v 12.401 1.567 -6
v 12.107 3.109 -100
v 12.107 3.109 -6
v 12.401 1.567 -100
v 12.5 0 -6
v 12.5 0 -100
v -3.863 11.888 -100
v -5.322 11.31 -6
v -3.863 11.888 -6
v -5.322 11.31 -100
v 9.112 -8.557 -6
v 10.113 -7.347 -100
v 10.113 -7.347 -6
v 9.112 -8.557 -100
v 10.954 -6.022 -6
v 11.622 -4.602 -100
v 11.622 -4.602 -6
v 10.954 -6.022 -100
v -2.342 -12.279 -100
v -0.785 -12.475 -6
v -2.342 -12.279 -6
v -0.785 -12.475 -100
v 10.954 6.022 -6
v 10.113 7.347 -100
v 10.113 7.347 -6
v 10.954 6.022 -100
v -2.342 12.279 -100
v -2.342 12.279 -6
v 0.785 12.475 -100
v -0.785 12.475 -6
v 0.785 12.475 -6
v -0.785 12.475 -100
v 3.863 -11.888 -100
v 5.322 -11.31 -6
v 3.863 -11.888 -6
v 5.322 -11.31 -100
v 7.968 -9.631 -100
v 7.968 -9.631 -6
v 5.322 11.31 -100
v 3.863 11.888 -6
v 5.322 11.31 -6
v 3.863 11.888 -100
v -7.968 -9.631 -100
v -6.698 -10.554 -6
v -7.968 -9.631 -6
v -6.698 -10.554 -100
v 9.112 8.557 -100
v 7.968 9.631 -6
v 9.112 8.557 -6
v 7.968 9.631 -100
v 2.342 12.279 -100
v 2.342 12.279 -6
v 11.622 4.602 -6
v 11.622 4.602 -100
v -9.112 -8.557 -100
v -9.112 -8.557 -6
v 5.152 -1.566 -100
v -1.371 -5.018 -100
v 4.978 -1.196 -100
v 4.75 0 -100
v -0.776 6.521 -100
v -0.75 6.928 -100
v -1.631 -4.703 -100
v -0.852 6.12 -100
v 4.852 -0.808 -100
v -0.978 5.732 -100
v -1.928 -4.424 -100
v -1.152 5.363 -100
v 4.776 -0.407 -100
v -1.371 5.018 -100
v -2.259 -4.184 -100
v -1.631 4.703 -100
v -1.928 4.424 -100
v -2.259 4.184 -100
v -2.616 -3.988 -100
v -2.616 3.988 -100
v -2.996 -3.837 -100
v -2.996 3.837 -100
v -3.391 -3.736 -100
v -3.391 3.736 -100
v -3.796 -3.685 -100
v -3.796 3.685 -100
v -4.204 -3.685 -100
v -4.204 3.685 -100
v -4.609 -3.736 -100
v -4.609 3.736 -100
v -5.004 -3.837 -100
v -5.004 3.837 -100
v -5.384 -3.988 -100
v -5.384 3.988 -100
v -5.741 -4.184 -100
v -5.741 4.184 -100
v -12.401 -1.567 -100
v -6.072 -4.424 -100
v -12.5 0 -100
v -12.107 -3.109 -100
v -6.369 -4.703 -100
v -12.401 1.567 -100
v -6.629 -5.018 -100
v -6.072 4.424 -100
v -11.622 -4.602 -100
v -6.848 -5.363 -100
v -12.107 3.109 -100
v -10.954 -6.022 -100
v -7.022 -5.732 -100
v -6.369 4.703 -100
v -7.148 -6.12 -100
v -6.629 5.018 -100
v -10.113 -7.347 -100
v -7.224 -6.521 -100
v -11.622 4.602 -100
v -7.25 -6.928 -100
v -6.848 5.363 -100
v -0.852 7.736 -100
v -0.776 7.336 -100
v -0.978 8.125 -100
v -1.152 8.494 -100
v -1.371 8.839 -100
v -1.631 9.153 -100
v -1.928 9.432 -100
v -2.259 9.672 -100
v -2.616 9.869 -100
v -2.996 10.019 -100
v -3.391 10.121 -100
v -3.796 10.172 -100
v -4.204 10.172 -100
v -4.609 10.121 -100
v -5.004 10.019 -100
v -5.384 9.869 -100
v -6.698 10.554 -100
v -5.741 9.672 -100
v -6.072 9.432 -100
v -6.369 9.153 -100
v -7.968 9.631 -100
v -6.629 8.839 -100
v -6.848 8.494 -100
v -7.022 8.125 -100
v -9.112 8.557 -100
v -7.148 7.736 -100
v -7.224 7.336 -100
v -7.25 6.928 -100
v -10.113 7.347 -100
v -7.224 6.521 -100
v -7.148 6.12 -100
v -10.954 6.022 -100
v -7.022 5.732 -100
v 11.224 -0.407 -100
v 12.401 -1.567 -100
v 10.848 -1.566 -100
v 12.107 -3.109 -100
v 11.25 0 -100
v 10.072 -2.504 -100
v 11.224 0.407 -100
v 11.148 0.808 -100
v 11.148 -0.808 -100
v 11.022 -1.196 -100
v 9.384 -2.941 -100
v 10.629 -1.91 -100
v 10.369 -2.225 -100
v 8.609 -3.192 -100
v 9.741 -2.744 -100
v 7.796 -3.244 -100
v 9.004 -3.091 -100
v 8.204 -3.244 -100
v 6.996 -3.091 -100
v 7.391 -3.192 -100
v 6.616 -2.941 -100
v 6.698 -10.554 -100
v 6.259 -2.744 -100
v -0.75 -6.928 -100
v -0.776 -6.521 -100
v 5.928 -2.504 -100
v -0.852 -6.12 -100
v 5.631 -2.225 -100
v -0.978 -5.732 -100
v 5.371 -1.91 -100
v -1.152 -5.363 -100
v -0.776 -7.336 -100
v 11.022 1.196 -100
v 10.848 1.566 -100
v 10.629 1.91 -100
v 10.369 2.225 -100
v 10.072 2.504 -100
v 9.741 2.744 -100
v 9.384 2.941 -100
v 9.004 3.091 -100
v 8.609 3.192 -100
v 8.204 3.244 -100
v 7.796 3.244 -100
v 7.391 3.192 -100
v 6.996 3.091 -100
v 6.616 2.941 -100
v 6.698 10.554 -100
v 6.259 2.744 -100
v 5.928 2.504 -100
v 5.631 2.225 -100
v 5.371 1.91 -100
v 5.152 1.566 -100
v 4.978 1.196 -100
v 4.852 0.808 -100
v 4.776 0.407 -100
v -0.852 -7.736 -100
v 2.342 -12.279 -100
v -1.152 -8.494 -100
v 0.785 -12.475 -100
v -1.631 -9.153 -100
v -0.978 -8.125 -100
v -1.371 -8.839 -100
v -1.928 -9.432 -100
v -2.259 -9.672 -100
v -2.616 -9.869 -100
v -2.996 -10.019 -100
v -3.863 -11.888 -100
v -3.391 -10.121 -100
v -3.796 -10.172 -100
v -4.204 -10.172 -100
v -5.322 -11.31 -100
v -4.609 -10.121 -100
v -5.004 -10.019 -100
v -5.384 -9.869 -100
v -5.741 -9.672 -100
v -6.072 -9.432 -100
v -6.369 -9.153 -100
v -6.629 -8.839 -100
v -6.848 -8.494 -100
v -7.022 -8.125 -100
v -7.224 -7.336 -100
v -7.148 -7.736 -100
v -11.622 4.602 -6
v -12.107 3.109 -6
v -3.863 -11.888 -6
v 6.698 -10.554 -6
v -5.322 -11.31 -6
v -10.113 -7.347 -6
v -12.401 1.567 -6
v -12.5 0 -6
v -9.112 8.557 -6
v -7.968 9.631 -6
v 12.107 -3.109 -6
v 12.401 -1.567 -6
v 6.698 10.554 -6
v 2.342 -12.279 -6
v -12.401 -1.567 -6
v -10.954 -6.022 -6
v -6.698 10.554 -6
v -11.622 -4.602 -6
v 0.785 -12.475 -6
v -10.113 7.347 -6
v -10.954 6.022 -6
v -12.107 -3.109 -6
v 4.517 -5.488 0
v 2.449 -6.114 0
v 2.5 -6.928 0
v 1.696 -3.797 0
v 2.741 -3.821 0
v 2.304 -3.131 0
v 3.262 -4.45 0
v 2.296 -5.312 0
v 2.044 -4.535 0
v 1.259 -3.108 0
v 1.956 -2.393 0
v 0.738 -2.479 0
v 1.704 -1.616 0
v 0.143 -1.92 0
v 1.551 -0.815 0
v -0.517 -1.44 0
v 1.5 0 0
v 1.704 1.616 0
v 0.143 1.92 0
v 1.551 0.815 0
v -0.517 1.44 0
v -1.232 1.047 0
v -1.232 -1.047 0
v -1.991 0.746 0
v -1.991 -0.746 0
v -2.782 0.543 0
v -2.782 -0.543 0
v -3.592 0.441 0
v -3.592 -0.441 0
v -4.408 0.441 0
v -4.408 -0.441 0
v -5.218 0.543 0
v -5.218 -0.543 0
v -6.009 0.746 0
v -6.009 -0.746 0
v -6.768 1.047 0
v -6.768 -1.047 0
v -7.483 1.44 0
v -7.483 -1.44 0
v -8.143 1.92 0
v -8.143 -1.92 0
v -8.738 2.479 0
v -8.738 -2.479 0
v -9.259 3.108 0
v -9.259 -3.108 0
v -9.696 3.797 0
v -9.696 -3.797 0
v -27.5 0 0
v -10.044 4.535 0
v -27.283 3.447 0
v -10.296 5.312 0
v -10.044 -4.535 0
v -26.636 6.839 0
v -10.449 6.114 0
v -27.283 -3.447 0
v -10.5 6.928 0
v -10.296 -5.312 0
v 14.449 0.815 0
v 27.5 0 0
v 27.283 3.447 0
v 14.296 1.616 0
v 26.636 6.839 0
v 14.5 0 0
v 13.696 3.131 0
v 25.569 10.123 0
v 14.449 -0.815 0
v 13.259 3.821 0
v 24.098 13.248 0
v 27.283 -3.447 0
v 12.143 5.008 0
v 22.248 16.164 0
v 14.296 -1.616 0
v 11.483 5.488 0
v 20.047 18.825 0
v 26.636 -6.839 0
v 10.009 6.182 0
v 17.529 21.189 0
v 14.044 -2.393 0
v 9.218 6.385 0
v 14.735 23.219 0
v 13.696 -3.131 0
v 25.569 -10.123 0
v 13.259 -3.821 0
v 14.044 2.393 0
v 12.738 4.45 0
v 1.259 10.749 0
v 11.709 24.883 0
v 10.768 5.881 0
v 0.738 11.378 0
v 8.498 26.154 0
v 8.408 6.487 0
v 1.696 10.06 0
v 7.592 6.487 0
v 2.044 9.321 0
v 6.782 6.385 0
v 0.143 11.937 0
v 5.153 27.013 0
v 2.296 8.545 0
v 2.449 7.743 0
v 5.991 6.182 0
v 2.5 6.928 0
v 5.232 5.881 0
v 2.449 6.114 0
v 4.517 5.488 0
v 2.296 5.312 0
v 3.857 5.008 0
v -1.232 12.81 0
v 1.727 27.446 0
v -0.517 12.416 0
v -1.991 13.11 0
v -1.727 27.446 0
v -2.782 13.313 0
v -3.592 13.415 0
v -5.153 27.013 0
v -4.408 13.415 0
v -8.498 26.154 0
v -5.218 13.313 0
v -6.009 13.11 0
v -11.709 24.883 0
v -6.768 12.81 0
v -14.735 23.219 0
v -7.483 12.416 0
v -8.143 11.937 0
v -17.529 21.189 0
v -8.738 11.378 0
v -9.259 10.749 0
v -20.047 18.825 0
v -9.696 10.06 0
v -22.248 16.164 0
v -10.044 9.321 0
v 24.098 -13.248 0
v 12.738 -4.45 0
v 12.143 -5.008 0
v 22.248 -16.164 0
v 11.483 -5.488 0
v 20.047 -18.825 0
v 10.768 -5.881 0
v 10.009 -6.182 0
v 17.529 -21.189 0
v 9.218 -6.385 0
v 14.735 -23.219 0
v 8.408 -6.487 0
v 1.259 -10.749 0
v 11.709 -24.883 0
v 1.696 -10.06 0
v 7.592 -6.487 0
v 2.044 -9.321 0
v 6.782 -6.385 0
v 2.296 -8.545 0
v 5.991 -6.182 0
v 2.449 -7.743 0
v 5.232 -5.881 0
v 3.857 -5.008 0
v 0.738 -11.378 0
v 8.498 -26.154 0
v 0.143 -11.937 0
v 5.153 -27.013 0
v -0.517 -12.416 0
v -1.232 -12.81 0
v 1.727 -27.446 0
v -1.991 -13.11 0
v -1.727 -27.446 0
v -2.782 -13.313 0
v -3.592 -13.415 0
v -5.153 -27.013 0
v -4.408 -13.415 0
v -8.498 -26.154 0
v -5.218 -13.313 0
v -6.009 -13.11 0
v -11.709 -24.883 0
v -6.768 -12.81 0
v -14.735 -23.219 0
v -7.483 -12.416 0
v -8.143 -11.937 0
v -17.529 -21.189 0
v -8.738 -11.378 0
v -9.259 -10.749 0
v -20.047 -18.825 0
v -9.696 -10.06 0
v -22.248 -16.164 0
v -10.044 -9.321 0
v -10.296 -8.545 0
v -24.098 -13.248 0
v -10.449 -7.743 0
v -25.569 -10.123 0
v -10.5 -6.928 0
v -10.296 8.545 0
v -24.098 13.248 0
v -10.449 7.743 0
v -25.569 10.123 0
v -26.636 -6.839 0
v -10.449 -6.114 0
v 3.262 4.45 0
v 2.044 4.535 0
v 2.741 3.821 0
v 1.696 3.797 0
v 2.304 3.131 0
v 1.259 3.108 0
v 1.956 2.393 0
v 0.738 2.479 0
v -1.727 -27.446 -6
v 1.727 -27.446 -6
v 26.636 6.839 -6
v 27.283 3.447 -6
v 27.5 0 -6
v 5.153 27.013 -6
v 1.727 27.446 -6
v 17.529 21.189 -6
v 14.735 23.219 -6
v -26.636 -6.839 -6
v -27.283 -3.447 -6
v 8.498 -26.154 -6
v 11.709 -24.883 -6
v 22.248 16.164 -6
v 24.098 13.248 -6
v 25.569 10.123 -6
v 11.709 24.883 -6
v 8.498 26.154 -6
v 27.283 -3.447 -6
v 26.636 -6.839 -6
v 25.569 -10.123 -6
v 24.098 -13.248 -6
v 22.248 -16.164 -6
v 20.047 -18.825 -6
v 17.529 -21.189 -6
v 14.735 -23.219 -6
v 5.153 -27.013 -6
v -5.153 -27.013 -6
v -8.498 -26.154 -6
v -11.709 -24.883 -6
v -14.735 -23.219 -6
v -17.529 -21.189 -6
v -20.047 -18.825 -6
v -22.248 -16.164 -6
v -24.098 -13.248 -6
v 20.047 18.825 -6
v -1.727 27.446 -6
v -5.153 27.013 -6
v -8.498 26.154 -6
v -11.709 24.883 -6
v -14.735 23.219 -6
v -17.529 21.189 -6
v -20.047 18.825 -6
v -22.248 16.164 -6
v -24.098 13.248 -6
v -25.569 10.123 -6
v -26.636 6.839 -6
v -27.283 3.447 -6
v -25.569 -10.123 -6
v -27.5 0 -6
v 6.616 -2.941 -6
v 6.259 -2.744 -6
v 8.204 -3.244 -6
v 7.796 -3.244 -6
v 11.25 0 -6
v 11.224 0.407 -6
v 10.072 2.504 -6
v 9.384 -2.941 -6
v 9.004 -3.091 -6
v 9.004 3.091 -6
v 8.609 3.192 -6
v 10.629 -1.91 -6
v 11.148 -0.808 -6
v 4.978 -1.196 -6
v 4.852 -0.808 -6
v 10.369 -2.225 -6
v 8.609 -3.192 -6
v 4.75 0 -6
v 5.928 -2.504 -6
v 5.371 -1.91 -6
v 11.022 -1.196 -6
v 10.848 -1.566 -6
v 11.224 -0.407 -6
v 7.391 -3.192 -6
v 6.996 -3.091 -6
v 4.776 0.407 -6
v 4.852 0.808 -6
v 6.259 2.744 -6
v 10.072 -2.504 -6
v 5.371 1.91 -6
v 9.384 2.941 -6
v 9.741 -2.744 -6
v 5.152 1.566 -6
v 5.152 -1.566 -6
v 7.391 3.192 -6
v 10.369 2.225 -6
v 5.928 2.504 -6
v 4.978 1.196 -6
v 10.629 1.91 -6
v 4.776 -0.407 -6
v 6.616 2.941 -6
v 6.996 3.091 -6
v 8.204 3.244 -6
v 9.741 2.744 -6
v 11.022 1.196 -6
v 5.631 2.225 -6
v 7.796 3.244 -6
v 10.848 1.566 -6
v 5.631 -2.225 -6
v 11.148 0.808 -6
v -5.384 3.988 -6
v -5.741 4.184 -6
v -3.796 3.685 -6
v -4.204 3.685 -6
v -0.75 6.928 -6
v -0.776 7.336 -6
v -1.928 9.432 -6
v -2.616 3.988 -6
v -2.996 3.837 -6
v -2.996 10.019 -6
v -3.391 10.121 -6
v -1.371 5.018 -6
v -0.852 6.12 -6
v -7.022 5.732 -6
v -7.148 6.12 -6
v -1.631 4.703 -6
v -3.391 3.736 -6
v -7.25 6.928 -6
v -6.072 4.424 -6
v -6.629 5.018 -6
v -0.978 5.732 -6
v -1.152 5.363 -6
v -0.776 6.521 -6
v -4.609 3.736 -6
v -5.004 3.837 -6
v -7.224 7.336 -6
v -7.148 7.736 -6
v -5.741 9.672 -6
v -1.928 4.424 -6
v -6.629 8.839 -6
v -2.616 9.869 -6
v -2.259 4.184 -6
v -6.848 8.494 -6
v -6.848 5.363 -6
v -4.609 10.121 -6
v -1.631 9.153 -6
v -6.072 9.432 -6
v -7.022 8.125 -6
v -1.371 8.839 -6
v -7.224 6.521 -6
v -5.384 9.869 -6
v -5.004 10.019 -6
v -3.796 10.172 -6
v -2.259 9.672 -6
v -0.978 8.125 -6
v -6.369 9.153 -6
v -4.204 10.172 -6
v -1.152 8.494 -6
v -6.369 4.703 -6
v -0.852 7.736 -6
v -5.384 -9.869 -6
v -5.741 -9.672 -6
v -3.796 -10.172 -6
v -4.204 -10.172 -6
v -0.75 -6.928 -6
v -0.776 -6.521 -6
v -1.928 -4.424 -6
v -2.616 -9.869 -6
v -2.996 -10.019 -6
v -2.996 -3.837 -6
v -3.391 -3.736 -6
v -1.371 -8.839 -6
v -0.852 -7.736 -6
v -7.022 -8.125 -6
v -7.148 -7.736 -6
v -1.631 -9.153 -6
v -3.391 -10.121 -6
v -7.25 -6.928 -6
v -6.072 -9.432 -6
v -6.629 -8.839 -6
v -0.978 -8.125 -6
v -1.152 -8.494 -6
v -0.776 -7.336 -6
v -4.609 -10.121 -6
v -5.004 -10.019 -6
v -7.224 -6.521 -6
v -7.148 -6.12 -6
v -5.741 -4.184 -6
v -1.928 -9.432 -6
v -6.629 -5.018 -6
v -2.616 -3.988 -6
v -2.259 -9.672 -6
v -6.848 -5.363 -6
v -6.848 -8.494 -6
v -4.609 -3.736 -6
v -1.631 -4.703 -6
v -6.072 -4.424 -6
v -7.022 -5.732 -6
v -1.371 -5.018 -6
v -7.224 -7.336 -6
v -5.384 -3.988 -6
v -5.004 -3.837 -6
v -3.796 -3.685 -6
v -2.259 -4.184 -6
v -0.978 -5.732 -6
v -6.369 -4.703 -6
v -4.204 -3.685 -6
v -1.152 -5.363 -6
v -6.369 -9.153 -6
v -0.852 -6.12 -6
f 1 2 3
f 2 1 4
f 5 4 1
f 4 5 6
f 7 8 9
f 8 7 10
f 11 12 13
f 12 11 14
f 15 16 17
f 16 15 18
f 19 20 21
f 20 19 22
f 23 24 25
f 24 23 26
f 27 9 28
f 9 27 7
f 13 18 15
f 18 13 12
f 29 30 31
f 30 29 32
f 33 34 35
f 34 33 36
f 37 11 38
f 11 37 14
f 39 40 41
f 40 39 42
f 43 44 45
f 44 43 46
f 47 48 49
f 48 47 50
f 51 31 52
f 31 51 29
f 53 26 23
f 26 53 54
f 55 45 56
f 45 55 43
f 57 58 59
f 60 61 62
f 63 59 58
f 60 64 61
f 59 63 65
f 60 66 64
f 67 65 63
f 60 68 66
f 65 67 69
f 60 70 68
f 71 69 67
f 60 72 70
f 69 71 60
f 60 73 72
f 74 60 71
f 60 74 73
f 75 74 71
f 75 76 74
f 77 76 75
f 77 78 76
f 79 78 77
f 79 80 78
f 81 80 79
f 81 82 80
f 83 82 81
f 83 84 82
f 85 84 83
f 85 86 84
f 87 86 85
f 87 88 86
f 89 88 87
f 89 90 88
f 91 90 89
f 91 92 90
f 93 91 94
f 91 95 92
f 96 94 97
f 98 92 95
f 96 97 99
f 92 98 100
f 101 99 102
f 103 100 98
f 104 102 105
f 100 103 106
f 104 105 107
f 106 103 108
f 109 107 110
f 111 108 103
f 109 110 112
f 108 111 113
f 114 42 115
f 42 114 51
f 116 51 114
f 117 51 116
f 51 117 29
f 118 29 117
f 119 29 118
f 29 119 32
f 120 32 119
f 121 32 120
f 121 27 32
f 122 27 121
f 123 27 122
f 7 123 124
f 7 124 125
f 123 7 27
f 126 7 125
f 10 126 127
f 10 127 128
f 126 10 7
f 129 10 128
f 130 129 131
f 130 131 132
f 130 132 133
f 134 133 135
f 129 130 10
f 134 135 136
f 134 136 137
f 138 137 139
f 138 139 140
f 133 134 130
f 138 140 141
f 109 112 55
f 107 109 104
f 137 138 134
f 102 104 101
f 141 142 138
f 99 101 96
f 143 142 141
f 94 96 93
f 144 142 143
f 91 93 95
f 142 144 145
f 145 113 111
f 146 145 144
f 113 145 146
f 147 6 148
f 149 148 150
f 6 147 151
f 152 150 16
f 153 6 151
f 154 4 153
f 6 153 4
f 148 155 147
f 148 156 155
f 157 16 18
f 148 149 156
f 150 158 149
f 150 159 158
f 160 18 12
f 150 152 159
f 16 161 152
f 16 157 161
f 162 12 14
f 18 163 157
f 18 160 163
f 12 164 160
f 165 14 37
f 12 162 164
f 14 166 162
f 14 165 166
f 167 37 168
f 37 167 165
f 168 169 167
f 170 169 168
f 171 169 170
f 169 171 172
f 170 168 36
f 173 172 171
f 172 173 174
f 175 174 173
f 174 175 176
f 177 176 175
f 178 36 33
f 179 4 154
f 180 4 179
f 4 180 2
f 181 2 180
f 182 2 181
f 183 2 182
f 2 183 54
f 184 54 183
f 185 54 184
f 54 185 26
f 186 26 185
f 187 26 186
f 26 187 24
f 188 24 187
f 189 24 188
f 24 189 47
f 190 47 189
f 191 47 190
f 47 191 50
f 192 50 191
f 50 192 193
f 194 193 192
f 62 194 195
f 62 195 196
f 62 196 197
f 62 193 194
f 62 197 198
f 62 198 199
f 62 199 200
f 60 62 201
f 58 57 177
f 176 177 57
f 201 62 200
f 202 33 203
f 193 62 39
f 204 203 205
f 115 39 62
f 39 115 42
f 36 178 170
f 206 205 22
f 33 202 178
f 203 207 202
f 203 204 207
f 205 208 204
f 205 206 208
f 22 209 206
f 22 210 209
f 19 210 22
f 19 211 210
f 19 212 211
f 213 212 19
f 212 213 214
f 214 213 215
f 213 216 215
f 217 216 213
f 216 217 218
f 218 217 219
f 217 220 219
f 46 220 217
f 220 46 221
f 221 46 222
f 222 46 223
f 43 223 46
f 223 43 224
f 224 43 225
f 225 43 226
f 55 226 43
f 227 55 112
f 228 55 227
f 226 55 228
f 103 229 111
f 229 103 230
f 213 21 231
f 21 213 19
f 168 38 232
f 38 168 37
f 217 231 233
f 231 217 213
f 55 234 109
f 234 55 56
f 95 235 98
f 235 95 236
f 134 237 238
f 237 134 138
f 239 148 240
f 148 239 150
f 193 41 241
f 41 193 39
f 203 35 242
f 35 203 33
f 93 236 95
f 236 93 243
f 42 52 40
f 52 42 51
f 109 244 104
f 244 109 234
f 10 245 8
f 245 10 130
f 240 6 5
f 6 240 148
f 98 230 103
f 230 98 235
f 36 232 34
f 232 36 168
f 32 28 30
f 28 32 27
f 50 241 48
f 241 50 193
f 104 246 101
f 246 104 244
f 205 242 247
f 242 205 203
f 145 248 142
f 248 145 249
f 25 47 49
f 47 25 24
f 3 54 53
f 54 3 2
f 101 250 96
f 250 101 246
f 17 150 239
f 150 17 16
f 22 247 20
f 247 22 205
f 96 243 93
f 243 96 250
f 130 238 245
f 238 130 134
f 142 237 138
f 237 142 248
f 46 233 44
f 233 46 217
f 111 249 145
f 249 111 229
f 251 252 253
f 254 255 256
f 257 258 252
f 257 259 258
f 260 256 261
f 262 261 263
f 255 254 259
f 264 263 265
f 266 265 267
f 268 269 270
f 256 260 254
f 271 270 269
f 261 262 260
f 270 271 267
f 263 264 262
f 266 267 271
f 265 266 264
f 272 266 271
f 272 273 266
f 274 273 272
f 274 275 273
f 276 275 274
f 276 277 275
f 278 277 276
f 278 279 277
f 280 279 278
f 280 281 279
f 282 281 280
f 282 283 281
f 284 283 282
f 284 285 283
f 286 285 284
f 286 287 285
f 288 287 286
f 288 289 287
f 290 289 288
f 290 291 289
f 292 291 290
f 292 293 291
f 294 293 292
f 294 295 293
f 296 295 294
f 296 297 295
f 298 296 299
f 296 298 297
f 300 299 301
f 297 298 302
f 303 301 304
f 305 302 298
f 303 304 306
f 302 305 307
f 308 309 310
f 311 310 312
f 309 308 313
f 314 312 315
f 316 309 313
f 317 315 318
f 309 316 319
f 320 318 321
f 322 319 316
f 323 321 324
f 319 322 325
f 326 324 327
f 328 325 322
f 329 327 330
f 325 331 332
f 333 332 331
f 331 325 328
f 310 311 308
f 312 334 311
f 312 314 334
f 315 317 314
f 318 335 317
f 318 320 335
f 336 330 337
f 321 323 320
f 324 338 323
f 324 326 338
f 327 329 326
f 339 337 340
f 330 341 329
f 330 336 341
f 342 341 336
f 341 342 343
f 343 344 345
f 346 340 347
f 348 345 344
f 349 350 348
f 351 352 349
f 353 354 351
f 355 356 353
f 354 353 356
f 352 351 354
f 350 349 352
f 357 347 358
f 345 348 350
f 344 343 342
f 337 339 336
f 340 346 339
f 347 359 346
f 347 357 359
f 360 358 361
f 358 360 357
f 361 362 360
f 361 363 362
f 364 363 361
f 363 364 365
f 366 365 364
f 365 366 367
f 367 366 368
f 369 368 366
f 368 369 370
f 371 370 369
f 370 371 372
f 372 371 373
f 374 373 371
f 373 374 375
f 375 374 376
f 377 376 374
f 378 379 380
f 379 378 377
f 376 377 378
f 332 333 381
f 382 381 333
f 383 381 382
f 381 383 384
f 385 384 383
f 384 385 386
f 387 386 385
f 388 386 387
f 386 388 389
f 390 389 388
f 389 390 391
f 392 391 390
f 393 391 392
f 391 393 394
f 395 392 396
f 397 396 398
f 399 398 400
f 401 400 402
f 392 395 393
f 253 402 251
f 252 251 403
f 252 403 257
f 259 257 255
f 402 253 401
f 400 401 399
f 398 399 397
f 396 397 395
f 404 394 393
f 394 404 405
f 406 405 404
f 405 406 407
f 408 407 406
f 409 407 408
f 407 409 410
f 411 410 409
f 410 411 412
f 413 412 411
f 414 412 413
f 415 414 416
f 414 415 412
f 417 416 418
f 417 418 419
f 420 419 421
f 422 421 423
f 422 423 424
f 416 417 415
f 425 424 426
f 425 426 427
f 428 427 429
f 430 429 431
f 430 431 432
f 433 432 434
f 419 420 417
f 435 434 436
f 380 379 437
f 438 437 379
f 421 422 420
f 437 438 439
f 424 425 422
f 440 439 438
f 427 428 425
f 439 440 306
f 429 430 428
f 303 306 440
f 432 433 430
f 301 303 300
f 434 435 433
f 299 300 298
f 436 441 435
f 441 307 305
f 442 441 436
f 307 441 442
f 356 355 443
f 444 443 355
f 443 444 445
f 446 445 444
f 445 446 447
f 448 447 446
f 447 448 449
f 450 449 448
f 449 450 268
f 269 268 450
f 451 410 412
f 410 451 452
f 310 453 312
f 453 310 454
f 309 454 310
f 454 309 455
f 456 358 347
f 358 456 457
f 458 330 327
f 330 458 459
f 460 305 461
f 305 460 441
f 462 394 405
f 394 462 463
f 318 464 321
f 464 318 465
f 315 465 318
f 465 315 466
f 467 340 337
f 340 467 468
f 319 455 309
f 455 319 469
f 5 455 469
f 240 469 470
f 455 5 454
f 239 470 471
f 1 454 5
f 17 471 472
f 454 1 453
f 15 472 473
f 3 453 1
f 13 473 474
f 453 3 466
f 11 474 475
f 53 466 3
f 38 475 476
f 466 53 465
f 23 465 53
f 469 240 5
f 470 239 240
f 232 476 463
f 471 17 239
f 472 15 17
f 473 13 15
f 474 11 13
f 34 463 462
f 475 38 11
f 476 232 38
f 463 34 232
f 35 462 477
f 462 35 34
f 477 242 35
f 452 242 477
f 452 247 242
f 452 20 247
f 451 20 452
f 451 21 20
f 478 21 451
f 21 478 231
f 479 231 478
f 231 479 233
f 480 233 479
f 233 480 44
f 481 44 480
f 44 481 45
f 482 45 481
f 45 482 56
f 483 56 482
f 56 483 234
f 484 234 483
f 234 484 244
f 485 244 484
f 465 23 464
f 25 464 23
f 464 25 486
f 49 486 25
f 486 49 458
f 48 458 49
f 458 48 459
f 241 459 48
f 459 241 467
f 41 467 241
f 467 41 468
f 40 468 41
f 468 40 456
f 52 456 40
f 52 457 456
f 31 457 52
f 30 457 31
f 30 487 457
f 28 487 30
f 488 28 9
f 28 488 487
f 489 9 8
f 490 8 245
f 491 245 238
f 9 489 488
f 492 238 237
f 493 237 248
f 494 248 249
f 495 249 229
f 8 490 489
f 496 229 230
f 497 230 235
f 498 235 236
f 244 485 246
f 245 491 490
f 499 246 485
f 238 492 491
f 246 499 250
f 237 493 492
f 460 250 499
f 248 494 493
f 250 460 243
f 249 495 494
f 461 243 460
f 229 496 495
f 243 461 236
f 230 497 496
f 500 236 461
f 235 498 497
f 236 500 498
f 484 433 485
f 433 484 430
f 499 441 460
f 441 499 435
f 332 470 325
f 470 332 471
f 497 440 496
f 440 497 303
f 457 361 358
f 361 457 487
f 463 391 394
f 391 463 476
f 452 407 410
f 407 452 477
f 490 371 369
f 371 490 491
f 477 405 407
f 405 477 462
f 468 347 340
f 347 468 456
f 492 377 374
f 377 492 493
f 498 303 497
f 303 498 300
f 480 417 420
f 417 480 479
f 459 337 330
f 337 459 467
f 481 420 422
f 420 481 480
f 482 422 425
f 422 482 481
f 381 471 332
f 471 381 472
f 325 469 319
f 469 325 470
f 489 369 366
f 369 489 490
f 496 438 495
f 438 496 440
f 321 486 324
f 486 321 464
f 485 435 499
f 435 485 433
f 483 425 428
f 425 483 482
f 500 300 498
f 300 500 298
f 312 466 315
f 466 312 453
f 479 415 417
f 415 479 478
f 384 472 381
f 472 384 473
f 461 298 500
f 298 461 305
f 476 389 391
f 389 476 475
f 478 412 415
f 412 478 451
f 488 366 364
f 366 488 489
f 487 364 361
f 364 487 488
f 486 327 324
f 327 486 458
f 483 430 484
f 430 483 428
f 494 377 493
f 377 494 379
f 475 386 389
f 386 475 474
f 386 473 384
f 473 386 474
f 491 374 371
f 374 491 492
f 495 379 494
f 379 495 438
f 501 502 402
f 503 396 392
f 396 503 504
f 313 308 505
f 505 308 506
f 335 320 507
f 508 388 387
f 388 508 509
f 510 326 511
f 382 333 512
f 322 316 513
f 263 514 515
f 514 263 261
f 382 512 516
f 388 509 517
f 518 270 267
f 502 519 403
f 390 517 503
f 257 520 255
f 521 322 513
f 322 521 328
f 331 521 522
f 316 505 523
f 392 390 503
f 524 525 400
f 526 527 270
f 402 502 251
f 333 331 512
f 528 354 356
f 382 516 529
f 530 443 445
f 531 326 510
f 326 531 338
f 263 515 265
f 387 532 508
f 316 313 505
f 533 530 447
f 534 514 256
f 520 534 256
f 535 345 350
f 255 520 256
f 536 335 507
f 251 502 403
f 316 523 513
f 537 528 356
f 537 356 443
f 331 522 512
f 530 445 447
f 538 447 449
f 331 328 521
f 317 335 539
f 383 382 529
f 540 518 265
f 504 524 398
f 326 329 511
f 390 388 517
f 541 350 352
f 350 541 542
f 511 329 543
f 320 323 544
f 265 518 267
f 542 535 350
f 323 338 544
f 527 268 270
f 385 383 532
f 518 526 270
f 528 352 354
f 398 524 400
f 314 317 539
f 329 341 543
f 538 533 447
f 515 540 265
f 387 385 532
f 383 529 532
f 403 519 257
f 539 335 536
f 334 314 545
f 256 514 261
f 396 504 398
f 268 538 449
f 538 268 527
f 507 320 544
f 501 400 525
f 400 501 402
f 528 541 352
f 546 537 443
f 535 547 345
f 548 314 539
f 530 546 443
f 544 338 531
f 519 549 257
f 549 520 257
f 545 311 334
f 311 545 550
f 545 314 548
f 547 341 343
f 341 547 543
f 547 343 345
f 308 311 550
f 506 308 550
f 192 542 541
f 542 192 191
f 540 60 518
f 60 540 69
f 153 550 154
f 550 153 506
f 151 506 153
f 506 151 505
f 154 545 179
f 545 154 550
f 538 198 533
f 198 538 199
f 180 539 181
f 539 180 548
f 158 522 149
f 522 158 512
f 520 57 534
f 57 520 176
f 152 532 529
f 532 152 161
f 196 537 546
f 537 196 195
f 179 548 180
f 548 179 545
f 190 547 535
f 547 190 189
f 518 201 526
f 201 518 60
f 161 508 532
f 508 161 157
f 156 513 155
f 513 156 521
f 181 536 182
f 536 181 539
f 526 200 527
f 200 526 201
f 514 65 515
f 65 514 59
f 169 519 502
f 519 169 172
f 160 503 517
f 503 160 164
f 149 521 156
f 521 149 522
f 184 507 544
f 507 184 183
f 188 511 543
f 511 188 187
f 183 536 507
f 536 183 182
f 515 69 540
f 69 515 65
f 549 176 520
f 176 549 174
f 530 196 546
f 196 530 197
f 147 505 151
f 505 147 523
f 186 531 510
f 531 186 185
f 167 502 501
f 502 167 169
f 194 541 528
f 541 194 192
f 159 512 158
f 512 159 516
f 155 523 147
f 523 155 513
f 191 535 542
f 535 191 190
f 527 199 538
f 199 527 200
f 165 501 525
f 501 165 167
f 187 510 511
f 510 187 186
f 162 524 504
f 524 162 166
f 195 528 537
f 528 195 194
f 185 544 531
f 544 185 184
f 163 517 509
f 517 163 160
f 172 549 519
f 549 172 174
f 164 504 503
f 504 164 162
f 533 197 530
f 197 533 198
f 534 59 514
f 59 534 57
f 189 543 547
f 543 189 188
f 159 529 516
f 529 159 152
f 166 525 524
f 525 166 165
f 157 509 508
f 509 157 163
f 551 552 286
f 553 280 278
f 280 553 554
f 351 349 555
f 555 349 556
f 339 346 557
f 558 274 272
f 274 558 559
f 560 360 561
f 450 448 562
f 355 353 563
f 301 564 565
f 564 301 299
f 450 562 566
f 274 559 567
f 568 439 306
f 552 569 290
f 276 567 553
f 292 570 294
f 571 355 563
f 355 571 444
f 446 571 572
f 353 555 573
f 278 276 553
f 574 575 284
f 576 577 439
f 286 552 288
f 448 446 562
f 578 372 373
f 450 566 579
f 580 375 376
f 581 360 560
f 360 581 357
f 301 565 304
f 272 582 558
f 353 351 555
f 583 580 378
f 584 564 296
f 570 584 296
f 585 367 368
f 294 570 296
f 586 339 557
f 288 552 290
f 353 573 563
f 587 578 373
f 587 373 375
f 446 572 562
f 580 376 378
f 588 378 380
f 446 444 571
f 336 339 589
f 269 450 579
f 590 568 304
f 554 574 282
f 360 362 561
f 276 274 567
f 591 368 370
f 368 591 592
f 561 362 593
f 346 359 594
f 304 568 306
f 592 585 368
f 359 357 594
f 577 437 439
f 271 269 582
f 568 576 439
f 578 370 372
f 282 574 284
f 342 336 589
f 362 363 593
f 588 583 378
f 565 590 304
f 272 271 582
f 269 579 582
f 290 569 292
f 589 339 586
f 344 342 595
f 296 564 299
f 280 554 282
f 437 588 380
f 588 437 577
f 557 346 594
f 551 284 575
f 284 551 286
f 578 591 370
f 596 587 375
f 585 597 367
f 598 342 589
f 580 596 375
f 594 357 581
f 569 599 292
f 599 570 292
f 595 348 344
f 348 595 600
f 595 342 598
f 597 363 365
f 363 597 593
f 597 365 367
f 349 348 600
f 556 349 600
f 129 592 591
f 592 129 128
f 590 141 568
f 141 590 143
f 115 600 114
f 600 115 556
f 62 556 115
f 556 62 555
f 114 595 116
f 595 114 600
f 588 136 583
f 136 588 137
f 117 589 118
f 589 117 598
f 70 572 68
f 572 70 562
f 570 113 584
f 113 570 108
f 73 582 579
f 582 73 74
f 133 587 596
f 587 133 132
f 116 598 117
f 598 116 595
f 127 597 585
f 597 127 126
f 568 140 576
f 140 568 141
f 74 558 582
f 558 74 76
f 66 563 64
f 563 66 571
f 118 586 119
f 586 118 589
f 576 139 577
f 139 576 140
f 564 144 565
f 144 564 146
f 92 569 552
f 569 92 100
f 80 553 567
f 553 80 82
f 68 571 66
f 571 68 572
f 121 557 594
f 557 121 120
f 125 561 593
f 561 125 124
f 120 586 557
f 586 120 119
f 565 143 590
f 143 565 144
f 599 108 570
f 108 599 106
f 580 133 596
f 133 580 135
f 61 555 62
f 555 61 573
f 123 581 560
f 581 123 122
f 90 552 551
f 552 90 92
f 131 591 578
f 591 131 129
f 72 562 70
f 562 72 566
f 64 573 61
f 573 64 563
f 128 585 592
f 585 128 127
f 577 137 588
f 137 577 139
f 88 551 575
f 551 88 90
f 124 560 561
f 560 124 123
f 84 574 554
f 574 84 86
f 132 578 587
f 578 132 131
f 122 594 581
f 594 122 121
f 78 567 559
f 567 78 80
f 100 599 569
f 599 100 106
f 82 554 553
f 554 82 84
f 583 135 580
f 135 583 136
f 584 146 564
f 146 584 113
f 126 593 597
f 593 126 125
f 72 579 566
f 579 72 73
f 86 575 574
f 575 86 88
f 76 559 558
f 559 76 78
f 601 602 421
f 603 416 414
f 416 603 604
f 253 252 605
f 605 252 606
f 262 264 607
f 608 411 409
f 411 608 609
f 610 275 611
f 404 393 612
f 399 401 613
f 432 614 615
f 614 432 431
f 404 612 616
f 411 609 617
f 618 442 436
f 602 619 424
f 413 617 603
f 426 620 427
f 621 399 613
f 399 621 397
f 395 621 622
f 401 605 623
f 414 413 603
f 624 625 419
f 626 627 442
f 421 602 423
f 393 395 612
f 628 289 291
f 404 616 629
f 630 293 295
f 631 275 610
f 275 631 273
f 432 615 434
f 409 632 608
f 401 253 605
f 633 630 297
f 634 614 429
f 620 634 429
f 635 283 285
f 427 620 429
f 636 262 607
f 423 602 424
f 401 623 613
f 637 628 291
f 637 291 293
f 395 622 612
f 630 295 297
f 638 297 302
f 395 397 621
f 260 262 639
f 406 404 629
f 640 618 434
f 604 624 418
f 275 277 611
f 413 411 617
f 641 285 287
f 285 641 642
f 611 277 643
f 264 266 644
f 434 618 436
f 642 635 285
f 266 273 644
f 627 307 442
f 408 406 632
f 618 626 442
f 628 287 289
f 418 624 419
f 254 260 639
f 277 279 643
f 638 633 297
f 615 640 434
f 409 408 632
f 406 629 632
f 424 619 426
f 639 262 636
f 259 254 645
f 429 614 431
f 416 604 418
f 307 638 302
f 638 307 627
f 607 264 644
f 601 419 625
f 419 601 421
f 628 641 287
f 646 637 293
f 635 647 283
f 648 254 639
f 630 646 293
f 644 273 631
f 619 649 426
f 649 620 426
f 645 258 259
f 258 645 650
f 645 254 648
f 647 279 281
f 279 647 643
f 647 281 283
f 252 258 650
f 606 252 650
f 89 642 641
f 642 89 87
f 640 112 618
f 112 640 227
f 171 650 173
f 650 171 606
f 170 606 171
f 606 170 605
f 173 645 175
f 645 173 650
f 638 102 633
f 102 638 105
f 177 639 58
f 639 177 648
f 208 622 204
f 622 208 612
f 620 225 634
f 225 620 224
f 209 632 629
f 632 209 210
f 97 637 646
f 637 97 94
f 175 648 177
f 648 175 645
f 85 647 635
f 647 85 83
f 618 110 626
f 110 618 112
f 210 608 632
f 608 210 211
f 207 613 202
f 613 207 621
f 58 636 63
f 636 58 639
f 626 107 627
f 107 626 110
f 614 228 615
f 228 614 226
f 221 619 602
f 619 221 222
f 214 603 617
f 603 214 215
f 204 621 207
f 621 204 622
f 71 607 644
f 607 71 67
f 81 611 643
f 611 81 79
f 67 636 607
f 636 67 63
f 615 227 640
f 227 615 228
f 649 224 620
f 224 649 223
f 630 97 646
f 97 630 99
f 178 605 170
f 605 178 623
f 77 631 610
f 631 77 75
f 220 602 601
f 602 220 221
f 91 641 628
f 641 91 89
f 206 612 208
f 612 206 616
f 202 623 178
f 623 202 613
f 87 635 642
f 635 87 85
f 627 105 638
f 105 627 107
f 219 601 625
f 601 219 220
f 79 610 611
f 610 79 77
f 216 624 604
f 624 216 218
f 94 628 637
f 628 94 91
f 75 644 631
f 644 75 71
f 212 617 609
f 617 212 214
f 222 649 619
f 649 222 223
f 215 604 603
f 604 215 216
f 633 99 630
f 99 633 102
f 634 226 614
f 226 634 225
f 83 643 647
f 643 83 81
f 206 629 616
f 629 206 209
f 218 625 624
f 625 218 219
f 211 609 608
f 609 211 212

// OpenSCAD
$fn = 50;


difference() {
	union() {
		translate(v = [0, 0, -100.0000000000]) {
			cylinder(h = 100, r = 12.5000000000);
		}
		translate(v = [0, 0, -6.0000000000]) {
			cylinder(h = 6, r = 27.5000000000);
		}
	}
	union() {
		translate(v = [8.0000000000, 0.0000000000, 0]) {
			rotate(a = [0, 0, 0]) {
				difference() {
					union() {
						#translate(v = [0, 0, -100.0000000000]) {
							cylinder(h = 100, r = 2.2500000000);
						}
						#translate(v = [0, 0, -6]) {
							cylinder(h = 6, r = 12.5000000000, r1 = 3.2500000000, r2 = 6.5000000000);
						}
						#translate(v = [0, 0, -100.0000000000]) {
							cylinder(h = 100, r = 3.2500000000);
						}
						#translate(v = [0, 0, -100.0000000000]) {
							cylinder(h = 100, r = 2.2500000000);
						}
					}
					union();
				}
			}
		}
		translate(v = [-4.0000000000, 6.9282032303, 0]) {
			rotate(a = [0, 0, 0]) {
				difference() {
					union() {
						#translate(v = [0, 0, -100.0000000000]) {
							cylinder(h = 100, r = 2.2500000000);
						}
						#translate(v = [0, 0, -6]) {
							cylinder(h = 6, r = 12.5000000000, r1 = 3.2500000000, r2 = 6.5000000000);
						}
						#translate(v = [0, 0, -100.0000000000]) {
							cylinder(h = 100, r = 3.2500000000);
						}
						#translate(v = [0, 0, -100.0000000000]) {
							cylinder(h = 100, r = 2.2500000000);
						}
					}
					union();
				}
			}
		}
		translate(v = [-4.0000000000, -6.9282032303, 0]) {
			rotate(a = [0, 0, 0]) {
				difference() {
					union() {
						#translate(v = [0, 0, -100.0000000000]) {
							cylinder(h = 100, r = 2.2500000000);
						}
						#translate(v = [0, 0, -6]) {
							cylinder(h = 6, r = 12.5000000000, r1 = 3.2500000000, r2 = 6.5000000000);
						}
						#translate(v = [0, 0, -100.0000000000]) {
							cylinder(h = 100, r = 3.2500000000);
						}
						#translate(v = [0, 0, -100.0000000000]) {
							cylinder(h = 100, r = 2.2500000000);
						}
					}
					union();
				}
			}
		}
	}
}
